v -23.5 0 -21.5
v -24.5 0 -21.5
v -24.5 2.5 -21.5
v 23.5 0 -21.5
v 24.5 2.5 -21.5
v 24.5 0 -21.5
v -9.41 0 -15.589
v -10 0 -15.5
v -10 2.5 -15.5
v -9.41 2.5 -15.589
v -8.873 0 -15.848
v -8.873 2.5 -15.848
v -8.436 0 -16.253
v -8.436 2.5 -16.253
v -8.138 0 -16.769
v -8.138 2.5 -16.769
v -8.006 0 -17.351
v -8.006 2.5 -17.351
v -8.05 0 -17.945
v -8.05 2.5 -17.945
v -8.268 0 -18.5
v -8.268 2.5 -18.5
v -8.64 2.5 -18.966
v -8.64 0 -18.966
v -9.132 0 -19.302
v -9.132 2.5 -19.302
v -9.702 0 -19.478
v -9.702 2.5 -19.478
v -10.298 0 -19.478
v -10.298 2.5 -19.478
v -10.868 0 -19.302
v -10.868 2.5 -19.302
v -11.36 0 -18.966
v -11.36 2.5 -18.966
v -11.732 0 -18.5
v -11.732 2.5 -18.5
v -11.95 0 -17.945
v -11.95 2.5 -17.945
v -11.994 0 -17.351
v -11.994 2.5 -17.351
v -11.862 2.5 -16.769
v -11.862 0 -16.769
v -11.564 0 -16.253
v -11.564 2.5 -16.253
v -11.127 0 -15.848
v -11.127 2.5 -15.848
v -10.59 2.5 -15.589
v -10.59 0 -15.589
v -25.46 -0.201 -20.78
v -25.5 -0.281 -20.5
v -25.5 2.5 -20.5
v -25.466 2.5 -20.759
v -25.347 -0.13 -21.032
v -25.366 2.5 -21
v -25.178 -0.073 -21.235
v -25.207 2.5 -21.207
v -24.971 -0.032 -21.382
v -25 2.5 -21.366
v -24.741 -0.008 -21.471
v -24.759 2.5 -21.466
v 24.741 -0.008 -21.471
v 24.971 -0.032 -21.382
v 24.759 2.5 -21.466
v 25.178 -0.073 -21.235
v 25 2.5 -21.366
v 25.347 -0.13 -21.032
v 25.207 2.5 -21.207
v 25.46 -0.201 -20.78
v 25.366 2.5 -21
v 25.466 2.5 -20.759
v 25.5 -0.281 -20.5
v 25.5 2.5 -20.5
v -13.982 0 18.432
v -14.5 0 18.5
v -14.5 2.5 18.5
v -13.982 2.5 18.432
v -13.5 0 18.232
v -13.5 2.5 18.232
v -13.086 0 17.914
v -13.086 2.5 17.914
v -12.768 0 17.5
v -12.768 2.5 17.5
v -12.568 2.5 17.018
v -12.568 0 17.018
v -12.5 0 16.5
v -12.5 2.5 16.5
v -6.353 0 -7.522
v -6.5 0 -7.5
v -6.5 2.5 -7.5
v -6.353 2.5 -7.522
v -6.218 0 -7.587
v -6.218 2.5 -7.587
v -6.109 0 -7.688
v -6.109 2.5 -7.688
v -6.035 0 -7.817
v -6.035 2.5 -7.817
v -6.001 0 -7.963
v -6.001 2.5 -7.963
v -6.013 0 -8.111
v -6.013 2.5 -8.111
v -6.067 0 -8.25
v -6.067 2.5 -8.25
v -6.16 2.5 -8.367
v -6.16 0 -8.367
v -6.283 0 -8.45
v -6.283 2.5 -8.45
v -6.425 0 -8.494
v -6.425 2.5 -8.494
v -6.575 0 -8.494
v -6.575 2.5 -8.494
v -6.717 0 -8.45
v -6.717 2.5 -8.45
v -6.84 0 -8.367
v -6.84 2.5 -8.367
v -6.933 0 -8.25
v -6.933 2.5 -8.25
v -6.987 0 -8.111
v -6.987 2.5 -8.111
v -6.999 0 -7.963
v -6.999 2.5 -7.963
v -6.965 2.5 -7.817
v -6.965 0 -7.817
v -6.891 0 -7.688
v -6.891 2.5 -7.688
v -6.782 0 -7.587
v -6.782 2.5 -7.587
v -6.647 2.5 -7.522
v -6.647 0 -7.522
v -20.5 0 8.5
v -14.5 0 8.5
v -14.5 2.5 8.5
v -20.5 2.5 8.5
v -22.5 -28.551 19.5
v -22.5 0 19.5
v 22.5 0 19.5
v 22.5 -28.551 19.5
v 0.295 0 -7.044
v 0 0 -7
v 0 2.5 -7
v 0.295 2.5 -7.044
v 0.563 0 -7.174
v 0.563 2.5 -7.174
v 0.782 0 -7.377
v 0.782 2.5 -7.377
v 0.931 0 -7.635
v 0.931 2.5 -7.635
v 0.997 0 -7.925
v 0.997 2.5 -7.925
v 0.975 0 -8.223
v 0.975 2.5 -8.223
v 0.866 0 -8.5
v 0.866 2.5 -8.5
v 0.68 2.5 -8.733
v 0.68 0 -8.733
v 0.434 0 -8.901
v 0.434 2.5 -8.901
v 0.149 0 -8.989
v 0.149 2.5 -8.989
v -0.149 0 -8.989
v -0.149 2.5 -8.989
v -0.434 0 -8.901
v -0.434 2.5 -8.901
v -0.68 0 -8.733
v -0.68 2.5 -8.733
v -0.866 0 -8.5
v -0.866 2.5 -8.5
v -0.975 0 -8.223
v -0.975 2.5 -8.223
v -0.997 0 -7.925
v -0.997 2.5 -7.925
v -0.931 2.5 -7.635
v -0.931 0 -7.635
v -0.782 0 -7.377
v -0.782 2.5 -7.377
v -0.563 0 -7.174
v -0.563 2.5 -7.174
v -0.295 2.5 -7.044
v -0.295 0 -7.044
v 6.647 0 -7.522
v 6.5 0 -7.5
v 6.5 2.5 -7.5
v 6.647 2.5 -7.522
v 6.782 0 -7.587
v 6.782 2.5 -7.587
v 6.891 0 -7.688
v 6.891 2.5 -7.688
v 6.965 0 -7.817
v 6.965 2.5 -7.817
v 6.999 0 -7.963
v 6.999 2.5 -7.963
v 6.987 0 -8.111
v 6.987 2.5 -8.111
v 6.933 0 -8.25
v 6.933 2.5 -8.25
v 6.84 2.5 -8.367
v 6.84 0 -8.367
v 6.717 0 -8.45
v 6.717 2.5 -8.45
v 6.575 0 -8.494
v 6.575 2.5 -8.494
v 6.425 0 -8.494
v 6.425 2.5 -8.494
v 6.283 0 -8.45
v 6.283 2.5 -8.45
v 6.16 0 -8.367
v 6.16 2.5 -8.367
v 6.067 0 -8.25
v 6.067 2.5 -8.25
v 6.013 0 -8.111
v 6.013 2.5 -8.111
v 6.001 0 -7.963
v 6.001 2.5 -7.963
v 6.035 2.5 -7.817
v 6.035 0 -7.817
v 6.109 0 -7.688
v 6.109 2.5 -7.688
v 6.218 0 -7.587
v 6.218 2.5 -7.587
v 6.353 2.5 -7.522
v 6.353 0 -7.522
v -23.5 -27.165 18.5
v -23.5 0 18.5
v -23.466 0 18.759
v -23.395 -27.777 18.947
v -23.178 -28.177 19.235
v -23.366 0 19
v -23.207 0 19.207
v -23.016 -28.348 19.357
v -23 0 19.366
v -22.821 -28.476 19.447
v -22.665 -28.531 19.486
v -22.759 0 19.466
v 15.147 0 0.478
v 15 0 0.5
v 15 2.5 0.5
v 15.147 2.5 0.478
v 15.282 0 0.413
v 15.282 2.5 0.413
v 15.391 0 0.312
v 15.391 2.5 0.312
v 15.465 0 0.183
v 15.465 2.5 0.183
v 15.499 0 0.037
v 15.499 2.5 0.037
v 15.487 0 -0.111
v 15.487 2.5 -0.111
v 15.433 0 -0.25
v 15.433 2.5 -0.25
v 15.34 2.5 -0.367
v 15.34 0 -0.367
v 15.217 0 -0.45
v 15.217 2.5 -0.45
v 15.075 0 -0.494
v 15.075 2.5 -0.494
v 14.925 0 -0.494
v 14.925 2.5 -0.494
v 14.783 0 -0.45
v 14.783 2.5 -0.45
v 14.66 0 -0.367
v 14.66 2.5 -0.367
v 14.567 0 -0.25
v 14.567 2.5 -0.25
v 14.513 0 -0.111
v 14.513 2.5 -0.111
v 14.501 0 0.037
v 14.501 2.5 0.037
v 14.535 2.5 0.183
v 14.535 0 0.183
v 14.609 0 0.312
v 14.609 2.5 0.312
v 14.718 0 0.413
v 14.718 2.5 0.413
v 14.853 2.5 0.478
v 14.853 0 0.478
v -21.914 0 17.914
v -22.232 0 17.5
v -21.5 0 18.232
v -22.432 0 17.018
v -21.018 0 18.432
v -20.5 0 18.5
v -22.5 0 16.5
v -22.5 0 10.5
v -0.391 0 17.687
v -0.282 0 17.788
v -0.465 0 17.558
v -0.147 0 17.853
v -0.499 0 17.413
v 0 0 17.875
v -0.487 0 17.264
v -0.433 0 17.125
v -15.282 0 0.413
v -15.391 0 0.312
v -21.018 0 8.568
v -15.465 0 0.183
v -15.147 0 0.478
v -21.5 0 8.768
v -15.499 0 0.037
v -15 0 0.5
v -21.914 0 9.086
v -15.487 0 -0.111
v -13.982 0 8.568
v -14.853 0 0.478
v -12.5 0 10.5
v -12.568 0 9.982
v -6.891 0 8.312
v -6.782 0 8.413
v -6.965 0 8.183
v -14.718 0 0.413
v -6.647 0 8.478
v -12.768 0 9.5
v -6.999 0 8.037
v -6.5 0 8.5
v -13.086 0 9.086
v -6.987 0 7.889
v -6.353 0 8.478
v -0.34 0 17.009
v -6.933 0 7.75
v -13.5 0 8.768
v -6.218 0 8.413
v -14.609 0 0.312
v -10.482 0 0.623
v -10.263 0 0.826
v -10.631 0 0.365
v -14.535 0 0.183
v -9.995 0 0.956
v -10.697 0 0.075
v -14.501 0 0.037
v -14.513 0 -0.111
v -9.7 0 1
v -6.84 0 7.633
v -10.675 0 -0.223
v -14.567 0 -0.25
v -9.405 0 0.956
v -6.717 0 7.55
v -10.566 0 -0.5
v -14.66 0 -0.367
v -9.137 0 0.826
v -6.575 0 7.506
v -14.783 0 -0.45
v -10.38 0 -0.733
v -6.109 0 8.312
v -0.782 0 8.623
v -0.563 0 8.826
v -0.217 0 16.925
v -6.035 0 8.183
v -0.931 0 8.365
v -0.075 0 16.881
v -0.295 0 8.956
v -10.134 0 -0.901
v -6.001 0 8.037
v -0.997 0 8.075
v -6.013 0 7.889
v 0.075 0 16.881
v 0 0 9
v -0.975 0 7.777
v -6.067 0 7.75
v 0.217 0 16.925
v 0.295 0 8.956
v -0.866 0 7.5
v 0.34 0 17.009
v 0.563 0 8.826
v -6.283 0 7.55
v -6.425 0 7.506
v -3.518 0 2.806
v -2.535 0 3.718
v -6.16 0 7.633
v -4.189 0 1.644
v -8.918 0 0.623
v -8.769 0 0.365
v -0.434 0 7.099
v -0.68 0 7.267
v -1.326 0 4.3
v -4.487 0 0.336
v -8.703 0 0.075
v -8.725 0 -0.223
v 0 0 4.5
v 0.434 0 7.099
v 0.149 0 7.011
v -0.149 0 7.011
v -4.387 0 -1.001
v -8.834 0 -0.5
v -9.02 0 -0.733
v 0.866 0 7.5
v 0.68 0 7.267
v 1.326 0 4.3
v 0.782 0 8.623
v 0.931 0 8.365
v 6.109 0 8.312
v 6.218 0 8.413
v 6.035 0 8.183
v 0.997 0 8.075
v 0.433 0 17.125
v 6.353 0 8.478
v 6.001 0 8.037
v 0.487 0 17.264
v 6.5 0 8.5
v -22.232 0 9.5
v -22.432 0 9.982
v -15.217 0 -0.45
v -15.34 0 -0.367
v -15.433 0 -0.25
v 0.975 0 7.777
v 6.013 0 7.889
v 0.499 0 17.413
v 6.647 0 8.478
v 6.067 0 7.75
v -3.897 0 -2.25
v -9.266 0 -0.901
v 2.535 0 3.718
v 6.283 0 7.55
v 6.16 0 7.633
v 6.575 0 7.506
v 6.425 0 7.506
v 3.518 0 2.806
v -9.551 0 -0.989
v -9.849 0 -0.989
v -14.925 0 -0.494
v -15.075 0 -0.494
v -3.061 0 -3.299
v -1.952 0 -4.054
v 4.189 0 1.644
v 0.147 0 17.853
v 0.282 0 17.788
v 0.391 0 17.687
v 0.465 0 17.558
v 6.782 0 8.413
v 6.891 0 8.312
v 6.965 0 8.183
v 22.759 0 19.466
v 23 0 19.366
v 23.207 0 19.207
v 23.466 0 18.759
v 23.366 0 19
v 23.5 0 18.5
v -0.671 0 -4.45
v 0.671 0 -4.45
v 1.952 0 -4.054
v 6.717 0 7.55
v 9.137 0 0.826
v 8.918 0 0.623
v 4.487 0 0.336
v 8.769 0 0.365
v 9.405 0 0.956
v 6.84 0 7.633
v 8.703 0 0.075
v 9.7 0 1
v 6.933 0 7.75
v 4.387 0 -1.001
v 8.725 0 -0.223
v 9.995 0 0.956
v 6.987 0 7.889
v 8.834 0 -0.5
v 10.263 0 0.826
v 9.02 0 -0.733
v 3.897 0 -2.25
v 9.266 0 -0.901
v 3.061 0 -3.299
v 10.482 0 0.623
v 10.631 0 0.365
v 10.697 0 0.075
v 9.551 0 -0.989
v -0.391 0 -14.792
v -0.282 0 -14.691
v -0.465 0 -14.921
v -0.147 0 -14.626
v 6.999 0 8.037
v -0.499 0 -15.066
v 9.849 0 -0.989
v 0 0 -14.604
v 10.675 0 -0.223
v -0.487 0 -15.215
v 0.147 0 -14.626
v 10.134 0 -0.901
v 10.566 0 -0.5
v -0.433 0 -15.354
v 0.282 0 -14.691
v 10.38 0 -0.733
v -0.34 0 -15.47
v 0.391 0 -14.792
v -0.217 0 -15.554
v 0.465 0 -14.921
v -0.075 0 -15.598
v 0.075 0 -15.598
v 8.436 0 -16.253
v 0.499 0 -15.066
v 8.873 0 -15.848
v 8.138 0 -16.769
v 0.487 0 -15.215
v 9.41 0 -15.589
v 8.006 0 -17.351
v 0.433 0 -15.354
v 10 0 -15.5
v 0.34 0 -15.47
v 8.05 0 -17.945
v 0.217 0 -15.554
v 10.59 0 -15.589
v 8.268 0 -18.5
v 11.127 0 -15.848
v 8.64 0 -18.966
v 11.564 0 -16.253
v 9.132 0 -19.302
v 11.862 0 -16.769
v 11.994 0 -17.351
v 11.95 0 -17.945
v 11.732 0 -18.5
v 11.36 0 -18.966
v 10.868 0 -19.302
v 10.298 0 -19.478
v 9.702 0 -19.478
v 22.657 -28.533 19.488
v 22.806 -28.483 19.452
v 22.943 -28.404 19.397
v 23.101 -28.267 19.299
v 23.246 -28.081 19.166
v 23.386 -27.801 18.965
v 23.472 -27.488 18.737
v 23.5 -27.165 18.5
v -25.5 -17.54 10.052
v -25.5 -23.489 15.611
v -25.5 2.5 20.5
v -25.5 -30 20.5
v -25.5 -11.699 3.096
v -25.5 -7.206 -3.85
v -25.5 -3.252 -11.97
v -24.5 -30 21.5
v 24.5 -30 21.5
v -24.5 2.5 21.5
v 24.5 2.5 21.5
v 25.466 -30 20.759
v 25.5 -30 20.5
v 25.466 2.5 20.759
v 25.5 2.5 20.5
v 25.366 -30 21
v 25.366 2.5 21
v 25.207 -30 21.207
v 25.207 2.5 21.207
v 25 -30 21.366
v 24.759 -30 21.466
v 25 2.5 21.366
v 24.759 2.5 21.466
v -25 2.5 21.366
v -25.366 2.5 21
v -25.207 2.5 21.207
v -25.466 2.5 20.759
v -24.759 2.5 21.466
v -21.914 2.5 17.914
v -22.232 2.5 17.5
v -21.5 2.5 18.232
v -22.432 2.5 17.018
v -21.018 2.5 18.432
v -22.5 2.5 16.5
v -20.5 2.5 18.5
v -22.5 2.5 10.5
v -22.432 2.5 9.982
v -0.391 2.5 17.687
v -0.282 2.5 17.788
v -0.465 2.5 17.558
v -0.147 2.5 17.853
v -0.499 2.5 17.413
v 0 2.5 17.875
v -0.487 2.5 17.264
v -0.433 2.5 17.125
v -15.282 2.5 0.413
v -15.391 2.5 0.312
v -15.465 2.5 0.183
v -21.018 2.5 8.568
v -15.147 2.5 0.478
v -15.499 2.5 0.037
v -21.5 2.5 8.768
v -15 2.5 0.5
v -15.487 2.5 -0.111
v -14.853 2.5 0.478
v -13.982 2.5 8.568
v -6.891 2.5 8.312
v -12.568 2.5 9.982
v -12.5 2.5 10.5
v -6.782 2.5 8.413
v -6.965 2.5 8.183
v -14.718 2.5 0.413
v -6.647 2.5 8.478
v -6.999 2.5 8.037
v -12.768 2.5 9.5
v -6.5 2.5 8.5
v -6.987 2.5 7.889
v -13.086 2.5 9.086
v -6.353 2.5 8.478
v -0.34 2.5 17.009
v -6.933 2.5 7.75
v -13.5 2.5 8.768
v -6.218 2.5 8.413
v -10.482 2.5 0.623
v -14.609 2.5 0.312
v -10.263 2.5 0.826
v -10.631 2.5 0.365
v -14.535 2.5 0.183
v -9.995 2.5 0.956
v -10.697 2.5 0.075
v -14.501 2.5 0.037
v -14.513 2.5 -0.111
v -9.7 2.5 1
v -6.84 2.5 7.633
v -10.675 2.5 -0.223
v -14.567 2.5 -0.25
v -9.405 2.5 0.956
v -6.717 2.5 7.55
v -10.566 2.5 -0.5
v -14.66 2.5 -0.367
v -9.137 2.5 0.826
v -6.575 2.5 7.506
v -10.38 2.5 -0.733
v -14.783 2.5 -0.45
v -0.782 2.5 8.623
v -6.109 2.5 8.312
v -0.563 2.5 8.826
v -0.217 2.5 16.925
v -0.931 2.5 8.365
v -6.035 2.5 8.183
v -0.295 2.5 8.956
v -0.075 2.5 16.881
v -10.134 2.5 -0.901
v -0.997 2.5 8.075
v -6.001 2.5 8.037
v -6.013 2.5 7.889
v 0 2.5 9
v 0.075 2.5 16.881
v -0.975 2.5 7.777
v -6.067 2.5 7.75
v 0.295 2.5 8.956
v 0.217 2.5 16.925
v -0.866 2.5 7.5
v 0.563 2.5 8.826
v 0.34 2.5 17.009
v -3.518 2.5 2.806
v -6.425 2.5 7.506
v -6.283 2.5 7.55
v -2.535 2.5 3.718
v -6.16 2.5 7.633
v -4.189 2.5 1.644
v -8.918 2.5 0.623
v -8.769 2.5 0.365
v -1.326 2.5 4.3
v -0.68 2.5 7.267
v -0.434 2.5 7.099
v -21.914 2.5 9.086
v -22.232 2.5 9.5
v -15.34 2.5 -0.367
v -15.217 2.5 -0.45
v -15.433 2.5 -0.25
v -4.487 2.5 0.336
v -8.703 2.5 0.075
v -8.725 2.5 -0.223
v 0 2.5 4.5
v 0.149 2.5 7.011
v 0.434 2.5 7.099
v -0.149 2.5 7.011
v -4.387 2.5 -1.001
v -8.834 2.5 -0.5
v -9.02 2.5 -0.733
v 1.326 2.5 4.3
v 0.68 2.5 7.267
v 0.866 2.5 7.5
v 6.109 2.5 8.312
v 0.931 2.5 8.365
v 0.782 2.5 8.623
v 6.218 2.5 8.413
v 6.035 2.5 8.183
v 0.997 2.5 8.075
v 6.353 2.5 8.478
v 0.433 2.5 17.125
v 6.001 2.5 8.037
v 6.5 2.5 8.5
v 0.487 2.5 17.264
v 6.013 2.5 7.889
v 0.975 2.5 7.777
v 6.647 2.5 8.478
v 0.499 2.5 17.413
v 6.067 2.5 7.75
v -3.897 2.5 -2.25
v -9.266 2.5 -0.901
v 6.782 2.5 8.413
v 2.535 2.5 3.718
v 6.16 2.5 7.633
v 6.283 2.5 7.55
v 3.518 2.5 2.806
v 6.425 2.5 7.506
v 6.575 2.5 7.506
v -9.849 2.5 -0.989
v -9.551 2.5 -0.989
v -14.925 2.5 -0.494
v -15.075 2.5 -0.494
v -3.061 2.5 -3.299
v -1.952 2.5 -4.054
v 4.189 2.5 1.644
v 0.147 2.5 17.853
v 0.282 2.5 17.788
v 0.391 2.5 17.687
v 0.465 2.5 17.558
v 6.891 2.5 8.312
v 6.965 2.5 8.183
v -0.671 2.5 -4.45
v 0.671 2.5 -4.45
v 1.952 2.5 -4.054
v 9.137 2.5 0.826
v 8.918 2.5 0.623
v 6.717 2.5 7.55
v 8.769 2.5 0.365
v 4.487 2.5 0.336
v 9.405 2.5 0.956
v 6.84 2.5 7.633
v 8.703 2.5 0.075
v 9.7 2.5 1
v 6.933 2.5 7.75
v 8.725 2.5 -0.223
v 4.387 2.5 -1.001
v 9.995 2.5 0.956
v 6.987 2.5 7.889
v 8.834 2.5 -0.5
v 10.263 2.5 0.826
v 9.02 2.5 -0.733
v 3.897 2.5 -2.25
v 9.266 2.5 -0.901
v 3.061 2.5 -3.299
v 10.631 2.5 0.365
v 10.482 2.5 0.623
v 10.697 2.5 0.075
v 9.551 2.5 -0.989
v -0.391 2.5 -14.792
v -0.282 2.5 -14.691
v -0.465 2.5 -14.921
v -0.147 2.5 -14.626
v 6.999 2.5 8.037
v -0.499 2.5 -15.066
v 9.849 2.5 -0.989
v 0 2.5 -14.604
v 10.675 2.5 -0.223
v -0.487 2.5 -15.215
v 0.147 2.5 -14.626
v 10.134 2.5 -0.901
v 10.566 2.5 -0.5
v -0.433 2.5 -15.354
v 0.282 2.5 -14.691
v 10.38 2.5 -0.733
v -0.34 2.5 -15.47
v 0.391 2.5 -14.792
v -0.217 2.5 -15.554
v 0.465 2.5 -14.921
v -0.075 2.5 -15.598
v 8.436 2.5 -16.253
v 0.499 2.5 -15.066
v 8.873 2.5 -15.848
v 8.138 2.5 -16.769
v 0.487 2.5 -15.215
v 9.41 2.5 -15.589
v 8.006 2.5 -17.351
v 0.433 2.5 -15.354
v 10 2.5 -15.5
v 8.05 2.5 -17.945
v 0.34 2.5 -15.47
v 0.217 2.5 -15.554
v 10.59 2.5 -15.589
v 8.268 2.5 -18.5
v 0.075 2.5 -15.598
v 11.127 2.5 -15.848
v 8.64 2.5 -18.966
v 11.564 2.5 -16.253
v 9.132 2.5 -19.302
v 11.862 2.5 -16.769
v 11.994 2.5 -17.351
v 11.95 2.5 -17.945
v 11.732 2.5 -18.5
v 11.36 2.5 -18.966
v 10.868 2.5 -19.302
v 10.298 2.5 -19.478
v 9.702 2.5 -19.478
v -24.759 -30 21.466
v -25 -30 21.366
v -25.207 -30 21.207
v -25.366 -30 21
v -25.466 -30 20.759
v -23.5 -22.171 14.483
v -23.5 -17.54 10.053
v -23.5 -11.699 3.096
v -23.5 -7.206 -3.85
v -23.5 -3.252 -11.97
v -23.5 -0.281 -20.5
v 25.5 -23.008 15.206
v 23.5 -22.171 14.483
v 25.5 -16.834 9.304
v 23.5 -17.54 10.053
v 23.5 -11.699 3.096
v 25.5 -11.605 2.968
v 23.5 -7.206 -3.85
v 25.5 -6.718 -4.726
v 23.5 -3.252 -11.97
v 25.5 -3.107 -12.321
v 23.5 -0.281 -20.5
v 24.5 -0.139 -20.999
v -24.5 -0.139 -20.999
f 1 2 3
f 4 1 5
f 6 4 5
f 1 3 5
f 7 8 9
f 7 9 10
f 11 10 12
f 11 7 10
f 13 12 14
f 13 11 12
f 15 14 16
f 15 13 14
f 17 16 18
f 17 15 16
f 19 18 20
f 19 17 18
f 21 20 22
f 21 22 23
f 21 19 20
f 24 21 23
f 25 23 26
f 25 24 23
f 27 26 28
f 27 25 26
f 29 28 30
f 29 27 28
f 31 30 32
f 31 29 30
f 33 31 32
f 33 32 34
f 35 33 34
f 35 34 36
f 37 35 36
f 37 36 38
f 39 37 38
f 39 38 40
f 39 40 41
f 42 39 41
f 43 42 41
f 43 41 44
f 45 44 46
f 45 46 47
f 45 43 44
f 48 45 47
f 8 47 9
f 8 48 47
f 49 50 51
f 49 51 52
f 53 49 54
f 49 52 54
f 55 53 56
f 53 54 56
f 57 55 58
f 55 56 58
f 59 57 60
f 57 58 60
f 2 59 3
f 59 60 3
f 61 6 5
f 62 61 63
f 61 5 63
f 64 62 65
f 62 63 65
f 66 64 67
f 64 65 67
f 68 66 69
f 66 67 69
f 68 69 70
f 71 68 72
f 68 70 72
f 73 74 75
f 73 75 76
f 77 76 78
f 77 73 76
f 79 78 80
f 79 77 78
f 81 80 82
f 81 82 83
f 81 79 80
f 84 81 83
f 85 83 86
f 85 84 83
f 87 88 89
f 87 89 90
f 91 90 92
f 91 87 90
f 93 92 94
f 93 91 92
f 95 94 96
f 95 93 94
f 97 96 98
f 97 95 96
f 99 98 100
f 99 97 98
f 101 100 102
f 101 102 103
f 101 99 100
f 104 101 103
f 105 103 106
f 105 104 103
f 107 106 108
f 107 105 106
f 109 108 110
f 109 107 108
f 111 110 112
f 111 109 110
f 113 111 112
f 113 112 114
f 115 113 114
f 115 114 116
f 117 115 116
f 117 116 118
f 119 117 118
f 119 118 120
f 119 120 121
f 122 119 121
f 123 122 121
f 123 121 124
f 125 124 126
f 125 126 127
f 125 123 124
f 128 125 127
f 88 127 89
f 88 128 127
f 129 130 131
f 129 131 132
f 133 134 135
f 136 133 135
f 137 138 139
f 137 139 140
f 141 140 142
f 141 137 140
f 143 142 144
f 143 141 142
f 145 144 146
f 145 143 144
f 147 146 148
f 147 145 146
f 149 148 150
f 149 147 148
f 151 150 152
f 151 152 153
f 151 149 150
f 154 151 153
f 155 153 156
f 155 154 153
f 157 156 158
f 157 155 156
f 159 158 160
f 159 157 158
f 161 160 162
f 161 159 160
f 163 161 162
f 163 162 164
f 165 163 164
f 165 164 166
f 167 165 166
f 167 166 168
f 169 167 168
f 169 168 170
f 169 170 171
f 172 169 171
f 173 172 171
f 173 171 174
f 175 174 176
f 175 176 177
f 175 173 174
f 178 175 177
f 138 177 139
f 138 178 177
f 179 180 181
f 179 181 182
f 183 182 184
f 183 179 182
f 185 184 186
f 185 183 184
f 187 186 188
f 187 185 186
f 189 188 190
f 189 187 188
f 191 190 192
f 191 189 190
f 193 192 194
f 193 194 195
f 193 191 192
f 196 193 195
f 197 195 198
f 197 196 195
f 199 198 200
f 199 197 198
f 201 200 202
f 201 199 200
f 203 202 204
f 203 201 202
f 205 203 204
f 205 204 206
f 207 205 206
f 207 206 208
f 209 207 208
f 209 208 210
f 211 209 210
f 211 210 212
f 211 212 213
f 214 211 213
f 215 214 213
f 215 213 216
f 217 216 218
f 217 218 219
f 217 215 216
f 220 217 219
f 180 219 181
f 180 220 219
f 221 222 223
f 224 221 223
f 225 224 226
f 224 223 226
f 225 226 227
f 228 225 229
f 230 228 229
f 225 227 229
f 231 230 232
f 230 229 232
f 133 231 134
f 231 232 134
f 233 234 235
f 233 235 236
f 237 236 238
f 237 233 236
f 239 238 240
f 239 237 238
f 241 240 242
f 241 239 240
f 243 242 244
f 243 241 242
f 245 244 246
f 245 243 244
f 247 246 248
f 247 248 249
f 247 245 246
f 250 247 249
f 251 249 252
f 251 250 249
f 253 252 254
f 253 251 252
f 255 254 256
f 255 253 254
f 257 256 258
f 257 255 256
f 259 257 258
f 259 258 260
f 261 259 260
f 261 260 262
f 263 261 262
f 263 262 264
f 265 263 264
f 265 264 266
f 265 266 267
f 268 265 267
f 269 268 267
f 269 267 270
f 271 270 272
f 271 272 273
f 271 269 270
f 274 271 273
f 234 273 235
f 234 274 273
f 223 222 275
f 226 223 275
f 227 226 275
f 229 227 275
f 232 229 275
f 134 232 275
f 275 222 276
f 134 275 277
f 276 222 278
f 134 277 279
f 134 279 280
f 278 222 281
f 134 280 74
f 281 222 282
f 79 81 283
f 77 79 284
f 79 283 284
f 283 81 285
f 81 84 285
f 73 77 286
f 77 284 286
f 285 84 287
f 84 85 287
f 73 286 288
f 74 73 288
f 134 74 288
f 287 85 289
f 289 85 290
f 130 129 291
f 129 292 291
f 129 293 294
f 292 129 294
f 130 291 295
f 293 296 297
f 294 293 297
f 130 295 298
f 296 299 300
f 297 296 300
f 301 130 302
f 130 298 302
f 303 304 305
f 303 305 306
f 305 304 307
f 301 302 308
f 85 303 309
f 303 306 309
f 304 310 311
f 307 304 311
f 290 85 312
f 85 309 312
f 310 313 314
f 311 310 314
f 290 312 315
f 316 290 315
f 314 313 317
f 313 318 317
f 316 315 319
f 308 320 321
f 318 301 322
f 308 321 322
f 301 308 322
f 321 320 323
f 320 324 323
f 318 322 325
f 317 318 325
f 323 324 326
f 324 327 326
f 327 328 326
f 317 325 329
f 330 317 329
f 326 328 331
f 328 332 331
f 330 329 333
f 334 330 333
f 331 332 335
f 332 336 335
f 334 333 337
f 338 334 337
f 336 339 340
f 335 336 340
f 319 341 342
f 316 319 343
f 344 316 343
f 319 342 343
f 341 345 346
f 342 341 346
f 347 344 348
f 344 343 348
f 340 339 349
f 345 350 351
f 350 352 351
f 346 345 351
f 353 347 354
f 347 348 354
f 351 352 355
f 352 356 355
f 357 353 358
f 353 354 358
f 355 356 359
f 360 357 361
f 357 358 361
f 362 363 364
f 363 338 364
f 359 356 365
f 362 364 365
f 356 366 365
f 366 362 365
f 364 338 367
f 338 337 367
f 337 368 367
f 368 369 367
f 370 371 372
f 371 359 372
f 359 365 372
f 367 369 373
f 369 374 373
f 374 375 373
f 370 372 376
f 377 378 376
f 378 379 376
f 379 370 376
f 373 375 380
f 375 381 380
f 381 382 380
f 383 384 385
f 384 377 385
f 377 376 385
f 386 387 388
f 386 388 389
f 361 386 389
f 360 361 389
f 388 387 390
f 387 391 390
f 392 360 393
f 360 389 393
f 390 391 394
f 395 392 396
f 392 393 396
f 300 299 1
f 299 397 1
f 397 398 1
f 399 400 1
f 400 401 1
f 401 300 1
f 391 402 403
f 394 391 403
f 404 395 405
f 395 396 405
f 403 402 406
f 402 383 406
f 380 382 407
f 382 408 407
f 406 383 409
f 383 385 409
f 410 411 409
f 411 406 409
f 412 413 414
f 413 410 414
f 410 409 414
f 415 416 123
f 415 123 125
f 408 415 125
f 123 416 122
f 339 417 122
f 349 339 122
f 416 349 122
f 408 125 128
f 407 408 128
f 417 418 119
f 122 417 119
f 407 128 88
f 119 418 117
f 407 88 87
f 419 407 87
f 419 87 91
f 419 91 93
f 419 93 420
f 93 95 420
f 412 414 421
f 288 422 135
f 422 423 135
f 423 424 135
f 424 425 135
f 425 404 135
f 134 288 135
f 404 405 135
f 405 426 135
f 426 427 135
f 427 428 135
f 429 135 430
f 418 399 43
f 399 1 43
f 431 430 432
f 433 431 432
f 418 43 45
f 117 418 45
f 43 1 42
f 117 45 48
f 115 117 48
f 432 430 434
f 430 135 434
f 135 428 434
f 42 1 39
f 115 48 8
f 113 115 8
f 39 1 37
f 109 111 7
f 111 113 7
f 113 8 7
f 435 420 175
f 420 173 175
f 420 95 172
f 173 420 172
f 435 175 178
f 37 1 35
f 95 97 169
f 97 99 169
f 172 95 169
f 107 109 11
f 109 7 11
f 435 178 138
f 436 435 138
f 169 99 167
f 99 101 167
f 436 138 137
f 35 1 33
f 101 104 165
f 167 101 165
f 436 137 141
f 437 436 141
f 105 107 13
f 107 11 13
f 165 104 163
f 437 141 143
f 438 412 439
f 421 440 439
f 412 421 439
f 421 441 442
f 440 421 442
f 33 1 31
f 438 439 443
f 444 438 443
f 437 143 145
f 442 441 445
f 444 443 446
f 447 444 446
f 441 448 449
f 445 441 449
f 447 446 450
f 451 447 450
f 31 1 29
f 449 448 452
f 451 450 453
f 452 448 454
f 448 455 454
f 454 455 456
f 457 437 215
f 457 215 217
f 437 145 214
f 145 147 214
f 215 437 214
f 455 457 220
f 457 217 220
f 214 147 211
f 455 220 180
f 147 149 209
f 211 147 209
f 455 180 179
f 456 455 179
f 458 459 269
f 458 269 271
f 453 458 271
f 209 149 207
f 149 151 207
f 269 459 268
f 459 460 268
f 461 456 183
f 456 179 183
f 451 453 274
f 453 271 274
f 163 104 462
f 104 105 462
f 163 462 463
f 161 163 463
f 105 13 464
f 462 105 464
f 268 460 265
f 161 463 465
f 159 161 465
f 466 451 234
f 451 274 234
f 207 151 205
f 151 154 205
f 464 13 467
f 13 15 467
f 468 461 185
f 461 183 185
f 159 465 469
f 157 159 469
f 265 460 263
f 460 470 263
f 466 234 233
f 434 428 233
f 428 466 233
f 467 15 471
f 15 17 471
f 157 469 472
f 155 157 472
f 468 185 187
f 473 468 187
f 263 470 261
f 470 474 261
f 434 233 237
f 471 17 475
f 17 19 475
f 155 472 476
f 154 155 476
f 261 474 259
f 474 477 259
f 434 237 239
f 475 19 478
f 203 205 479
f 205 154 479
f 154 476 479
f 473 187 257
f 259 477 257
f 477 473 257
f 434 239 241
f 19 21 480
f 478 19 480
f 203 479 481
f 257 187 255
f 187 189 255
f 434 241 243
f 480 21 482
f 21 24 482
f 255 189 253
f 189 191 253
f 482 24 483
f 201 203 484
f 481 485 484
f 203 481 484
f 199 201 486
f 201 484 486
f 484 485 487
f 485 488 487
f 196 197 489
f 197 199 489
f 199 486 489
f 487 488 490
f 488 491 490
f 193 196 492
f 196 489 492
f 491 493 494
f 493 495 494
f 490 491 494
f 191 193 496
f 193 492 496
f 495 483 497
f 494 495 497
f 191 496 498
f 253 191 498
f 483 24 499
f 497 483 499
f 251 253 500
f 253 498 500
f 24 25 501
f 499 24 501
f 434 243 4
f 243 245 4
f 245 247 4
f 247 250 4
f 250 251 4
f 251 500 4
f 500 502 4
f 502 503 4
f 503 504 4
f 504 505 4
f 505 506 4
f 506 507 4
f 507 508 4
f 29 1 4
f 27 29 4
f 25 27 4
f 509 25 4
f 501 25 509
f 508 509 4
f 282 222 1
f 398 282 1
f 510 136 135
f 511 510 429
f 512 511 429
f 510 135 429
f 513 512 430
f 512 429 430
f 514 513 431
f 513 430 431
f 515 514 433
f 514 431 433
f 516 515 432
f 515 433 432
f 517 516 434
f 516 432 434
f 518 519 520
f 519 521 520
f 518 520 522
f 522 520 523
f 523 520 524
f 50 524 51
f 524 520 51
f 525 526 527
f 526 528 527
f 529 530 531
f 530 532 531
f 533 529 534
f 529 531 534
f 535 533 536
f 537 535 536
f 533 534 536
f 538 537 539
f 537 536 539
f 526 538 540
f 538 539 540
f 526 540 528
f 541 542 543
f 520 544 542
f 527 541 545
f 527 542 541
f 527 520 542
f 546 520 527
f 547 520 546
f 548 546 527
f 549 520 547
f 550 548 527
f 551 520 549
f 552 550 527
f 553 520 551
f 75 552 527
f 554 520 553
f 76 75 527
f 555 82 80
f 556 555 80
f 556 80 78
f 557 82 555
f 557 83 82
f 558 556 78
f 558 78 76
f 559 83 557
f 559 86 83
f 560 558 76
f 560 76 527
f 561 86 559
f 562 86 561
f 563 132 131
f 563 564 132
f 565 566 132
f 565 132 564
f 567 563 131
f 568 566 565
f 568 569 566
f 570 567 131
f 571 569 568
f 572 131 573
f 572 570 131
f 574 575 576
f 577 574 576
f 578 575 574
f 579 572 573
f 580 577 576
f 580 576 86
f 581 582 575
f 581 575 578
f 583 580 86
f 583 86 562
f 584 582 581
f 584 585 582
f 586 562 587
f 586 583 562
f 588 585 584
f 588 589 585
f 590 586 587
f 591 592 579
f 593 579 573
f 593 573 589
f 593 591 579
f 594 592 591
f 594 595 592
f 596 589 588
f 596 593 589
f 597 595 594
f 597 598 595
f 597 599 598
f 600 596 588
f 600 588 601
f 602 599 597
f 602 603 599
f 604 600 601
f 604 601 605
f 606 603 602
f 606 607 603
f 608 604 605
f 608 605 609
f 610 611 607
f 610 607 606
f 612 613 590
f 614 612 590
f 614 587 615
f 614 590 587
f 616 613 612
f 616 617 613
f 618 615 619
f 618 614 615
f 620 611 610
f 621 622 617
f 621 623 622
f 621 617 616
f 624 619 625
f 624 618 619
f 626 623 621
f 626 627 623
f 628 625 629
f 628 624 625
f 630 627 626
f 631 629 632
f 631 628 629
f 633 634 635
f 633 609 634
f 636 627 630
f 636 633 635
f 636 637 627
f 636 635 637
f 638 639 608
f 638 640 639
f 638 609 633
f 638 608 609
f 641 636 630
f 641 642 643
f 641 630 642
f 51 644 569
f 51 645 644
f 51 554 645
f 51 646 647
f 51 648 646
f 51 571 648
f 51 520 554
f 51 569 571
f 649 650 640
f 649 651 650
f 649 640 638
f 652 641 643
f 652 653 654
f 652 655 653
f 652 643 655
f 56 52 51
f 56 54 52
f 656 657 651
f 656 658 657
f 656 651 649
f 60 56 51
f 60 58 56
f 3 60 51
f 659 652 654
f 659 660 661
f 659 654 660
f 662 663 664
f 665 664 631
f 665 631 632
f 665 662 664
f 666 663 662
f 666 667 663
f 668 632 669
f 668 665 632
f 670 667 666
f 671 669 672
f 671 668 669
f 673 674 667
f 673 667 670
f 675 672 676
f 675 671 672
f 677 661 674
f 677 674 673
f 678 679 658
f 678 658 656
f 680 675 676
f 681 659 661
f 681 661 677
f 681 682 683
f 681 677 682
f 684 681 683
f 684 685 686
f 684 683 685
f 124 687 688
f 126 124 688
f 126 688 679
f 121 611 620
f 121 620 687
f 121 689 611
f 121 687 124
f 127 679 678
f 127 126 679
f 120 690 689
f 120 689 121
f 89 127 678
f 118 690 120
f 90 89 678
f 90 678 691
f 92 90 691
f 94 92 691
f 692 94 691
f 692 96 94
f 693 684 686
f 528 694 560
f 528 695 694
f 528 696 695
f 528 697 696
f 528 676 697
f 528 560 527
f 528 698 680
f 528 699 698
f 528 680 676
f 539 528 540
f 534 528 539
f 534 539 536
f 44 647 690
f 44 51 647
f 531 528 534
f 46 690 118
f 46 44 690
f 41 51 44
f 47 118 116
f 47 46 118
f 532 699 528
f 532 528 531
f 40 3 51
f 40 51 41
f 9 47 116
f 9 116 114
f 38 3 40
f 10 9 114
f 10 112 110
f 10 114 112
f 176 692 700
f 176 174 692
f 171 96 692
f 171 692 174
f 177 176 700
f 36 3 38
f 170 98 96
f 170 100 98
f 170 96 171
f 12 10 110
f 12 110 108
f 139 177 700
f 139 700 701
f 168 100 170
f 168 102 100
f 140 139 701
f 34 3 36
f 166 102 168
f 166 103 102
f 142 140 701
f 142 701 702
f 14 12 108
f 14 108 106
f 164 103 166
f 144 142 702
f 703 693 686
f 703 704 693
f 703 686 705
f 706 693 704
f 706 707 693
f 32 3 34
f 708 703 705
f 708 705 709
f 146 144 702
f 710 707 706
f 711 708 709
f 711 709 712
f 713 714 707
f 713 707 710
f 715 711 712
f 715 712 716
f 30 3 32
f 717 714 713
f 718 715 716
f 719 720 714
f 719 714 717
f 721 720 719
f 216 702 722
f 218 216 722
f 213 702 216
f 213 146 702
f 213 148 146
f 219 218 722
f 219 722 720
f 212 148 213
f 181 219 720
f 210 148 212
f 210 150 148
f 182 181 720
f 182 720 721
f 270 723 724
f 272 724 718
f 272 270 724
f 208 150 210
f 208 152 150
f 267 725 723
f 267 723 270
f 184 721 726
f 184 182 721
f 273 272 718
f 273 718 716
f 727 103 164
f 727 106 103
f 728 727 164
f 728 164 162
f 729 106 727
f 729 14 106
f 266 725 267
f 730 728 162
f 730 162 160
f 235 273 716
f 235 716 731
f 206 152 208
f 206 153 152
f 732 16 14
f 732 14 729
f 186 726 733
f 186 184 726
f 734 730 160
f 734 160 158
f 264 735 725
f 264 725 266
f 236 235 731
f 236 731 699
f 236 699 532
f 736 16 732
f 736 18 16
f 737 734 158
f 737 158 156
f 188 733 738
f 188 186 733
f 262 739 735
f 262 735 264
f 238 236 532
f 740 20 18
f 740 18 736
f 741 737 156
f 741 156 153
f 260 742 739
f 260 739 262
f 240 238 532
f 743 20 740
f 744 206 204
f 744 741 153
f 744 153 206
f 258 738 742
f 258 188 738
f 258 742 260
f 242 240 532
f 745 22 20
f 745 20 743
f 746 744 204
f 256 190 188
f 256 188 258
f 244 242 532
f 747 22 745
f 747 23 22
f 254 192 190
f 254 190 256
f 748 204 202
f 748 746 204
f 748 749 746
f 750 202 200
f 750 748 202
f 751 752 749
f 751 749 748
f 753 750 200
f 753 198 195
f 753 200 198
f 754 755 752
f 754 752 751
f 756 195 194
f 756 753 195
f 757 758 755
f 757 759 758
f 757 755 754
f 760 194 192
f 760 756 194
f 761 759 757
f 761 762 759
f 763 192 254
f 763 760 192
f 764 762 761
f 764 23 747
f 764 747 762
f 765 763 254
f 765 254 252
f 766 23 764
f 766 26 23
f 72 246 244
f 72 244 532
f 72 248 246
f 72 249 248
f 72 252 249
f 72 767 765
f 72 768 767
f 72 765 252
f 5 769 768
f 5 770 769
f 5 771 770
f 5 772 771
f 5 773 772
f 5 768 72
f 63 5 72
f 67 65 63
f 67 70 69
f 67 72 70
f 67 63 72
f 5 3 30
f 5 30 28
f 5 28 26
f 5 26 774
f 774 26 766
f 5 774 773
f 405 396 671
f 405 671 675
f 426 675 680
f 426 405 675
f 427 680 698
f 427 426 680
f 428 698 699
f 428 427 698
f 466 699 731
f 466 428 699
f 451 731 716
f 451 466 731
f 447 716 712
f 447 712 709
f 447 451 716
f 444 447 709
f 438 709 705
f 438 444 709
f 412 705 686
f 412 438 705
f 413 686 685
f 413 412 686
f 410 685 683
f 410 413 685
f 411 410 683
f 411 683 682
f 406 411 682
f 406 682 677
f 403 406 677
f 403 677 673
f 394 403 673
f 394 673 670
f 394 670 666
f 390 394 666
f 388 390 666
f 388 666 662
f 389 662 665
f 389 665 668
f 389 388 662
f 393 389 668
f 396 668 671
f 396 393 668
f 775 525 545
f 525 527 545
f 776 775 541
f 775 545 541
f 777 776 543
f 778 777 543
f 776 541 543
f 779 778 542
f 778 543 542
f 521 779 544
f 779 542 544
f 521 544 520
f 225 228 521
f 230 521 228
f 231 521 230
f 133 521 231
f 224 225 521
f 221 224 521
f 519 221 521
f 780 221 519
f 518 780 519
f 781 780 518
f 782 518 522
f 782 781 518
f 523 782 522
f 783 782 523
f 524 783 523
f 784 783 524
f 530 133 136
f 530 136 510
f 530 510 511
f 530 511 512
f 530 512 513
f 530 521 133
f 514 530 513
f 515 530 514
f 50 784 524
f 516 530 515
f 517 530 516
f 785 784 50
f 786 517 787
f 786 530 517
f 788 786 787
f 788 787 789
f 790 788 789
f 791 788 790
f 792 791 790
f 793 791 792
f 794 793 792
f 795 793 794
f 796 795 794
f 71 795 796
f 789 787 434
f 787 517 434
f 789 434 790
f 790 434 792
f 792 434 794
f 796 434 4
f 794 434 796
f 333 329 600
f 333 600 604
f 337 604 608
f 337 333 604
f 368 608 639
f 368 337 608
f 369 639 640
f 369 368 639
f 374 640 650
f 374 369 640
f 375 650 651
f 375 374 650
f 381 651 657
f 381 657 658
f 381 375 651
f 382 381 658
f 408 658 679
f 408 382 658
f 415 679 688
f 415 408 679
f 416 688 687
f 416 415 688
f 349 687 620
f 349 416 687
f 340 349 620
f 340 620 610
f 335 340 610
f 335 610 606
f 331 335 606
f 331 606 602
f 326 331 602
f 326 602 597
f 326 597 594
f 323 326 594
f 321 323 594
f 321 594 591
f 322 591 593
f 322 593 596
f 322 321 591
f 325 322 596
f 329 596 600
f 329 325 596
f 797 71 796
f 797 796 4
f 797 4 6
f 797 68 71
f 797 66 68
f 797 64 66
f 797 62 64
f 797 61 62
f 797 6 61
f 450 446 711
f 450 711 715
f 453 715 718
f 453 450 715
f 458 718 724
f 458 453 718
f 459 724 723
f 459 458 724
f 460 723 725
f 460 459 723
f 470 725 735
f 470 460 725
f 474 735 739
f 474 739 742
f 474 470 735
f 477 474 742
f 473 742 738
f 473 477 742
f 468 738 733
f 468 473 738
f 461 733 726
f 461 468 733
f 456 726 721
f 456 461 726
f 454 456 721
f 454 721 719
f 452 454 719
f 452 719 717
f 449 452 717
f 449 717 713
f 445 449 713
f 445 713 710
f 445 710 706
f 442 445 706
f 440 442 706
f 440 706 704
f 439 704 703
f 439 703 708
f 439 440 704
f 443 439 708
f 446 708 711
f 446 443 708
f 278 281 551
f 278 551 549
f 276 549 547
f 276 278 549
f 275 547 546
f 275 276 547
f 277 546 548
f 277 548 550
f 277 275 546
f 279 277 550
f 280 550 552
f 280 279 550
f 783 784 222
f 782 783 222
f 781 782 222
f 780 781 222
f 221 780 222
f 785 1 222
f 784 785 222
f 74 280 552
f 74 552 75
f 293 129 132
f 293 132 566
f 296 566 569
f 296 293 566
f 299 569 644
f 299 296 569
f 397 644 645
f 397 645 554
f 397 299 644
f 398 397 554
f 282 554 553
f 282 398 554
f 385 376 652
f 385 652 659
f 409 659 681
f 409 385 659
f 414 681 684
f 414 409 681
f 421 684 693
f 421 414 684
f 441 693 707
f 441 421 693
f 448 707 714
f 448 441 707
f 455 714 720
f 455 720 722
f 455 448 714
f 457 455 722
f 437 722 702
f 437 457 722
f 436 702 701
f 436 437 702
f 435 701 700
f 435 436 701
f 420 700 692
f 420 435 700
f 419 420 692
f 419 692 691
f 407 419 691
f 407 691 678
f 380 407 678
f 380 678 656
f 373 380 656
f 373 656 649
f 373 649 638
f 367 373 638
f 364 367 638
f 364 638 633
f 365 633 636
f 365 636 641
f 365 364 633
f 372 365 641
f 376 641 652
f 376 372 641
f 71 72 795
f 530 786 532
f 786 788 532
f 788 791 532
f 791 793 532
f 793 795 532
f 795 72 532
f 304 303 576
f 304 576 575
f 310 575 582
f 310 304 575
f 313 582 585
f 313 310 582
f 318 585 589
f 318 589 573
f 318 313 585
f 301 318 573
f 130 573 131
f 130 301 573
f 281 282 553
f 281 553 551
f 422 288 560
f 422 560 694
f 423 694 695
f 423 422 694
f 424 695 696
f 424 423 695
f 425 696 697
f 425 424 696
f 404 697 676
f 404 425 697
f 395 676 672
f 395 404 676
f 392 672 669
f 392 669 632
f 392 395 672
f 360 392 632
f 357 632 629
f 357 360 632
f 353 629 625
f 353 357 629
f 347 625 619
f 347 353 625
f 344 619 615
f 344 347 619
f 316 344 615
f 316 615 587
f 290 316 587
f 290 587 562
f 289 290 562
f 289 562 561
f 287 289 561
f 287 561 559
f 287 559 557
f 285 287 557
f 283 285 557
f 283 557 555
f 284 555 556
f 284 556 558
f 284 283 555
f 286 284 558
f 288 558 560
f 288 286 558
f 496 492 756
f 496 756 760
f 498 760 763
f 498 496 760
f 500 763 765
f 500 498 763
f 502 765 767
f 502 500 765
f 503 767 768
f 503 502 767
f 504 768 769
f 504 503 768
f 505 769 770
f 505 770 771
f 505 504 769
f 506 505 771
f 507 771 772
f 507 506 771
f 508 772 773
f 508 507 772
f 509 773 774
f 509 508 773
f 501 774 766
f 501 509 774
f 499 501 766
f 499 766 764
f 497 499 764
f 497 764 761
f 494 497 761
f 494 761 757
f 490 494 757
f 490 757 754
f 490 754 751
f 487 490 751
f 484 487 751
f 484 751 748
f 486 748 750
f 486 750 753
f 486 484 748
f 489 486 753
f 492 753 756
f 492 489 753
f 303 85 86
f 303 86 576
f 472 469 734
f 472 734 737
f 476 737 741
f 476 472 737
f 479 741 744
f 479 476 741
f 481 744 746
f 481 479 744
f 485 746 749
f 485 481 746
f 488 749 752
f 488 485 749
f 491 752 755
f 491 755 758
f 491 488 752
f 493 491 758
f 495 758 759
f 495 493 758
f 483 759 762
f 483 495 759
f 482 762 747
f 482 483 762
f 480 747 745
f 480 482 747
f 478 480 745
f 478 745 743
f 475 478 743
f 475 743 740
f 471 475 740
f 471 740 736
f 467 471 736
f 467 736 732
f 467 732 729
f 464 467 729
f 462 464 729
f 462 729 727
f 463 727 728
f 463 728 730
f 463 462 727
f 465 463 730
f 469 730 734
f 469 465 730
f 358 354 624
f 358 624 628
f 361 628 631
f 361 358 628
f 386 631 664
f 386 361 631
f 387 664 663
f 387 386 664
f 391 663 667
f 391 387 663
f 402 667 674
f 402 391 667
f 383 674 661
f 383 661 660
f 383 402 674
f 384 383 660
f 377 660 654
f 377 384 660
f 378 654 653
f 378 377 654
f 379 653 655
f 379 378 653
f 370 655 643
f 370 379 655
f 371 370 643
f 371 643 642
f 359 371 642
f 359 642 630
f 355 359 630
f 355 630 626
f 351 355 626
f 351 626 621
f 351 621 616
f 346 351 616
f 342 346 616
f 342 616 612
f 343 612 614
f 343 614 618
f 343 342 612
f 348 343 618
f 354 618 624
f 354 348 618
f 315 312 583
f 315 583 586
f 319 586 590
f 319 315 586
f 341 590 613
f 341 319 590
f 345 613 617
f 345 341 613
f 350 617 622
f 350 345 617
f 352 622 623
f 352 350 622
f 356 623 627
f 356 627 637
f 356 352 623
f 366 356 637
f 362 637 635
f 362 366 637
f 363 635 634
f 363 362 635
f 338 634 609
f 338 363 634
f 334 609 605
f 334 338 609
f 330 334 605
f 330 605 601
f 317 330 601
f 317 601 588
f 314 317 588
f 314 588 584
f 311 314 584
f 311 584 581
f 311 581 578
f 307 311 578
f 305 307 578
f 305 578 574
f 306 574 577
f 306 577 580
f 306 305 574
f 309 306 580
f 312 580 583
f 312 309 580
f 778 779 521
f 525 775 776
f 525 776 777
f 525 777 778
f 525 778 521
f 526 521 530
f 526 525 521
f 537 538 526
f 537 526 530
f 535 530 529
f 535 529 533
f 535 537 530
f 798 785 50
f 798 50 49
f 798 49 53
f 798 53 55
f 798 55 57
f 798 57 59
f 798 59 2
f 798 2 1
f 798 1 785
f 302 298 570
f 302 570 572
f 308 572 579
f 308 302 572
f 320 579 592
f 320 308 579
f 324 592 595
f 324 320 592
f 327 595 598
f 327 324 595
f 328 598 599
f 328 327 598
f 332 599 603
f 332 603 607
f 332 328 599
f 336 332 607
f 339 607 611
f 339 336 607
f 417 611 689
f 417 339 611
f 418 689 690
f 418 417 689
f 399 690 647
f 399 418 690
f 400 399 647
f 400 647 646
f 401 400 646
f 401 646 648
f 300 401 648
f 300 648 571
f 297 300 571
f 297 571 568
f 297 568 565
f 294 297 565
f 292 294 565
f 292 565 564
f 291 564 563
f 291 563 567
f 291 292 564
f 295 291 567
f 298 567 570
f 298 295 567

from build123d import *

# Parameters (mm, degrees)
SKETCH1_W           = 51
SKETCH1_H           = 43
SKETCH1_R           = 4.5
SKETCH1_R_2         = 1
SKETCH1_R_3         = 2
SKETCH1_R_4         = 0.5
BOSS_EXTRUDE1_DEPTH = 2.5
FILLET1_R           = 1
BOSS_EXTRUDE2_DEPTH = 30
CUT_EXTRUDE1_DEPTH  = 67


with BuildPart() as part:
    # Sketch1 → Boss-Extrude1 (new body)
    with BuildSketch(Plane(origin=(0, 0, 0), x_dir=(1, 0, 0), z_dir=(0, 1, 0))):
        Rectangle(SKETCH1_W, SKETCH1_H)
        with Locations(Location((0, 0, 0), (0, 0, 270))):
            Circle(SKETCH1_R, mode=Mode.SUBTRACT)
        with Locations(Location((9.7, 0, 0), (0, 0, 270))):
            Circle(SKETCH1_R_2, mode=Mode.SUBTRACT)
        with Locations(Location((-9.7, 0, 0), (0, 0, 270))):
            Circle(SKETCH1_R_2, mode=Mode.SUBTRACT)
        with Locations(Location((0, 8, 0), (0, 0, 270))):
            Circle(SKETCH1_R_2, mode=Mode.SUBTRACT)
        with Locations(Location((0, -8, 0), (0, 0, 270))):
            Circle(SKETCH1_R_2, mode=Mode.SUBTRACT)
        with Locations(Location((-10, 17.5, 0), (0, 0, 270))):
            Circle(SKETCH1_R_3, mode=Mode.SUBTRACT)
        with Locations(Location((10, 17.5, 0), (0, 0, 270))):
            Circle(SKETCH1_R_3, mode=Mode.SUBTRACT)
        with Locations(Location((-15, 0, 0), (0, 0, 270))):
            Circle(SKETCH1_R_4, mode=Mode.SUBTRACT)
        with Locations(Location((15, 0, 0), (0, 0, 270))):
            Circle(SKETCH1_R_4, mode=Mode.SUBTRACT)
        with Locations(Location((0, -17.375333522, 0), (0, 0, 270))):
            Circle(SKETCH1_R_4, mode=Mode.SUBTRACT)
        with Locations(Location((0, 15.103719109, 0), (0, 0, 270))):
            Circle(SKETCH1_R_4, mode=Mode.SUBTRACT)
        with Locations(Location((6.5, 8, 0), (0, 0, 270))):
            Circle(SKETCH1_R_4, mode=Mode.SUBTRACT)
        with Locations(Location((-6.5, 8, 0), (0, 0, 270))):
            Circle(SKETCH1_R_4, mode=Mode.SUBTRACT)
        with Locations(Location((-6.5, -8, 0), (0, 0, 270))):
            Circle(SKETCH1_R_4, mode=Mode.SUBTRACT)
        with Locations(Location((6.5, -8, 0), (0, 0, 270))):
            Circle(SKETCH1_R_4, mode=Mode.SUBTRACT)
        with BuildLine():
            Line((-20.5, -18.5), (-14.5, -18.5))
            ThreePointArc((-14.5, -18.5), (-13.085786438, -17.914213562), (-12.5, -16.5))
            Line((-12.5, -16.5), (-12.5, -10.5))
            ThreePointArc((-12.5, -10.5), (-13.085786438, -9.085786438), (-14.5, -8.5))
            Line((-14.5, -8.5), (-20.5, -8.5))
            ThreePointArc((-20.5, -8.5), (-21.914213562, -9.085786438), (-22.5, -10.5))
            Line((-22.5, -10.5), (-22.5, -16.5))
            ThreePointArc((-22.5, -16.5), (-21.914213562, -17.914213562), (-20.5, -18.5))
        make_face(mode=Mode.SUBTRACT)
    extrude(amount=BOSS_EXTRUDE1_DEPTH)

    # Fillet1
    fillet1_edges = [part.edges().sort_by_distance(p)[0] for p in [
        (25.5, 1.25, -21.5),
        (25.5, 1.25, 21.5),
        (-25.5, 1.25, 21.5),
        (-25.5, 1.25, -21.5),
    ]]
    fillet(fillet1_edges, radius=FILLET1_R)

    # Sketch2 → Boss-Extrude2 (add)
    with BuildSketch(Plane.XZ):
        with BuildLine():
            Line((-23.5, -21.5), (-23.5, 18.5))
            ThreePointArc((-23.5, 18.5), (-23.207106781, 19.207106781), (-22.5, 19.5))
            Line((-22.5, 19.5), (22.5, 19.5))
            ThreePointArc((22.5, 19.5), (23.207106781, 19.207106781), (23.5, 18.5))
            Line((23.5, 18.5), (23.5, -21.5))
            Line((23.5, -21.5), (24.5, -21.5))
            ThreePointArc((24.5, -21.5), (25.207106781, -21.207106781), (25.5, -20.5))
            Line((25.5, -20.5), (25.5, 20.5))
            ThreePointArc((25.5, 20.5), (25.207106781, 21.207106781), (24.5, 21.5))
            Line((24.5, 21.5), (-24.5, 21.5))
            ThreePointArc((-24.5, 21.5), (-25.207106781, 21.207106781), (-25.5, 20.5))
            Line((-25.5, 20.5), (-25.5, -20.5))
            ThreePointArc((-25.5, -20.5), (-25.207106781, -21.207106781), (-24.5, -21.5))
            Line((-24.5, -21.5), (-23.5, -21.5))
        make_face()
    extrude(amount=BOSS_EXTRUDE2_DEPTH)

    # Sketch3 → Cut-Extrude1 (cut)
    with BuildSketch(Plane(origin=(25.5, 0, 0), x_dir=(0, 0, -1), z_dir=(1, 0, 0))):
        with BuildLine():
            add(Edge.make_bspline(
                [(-20.5, -30), (-5.501277344, -7.754009084), (20.5, -0.280836845)],
                knots=[0, 0, 0, 0.981207698, 0.981207698, 0.981207698], degree=2))
            Line((-20.5, -30), (20.5, -30))
            Line((20.5, -30), (20.5, -0.280836845))
        make_face()
        with BuildLine():
            Line((20.5, -30), (-20.5, -30))
            Line((-20.5, -30), (-11.71480256, -35.881315146))
            Line((-11.71480256, -35.881315146), (34.782094199, -34.613217961))
            Line((34.782094199, -34.613217961), (27.415053414, -3.212716254))
            Line((27.415053414, -3.212716254), (21.5, 0))
            add(Edge.make_bspline(
                [(20.5, -0.280836845), (20.997982091, -0.137709033), (21.5, 0)],
                knots=[0.981207698, 0.981207698, 0.981207698, 1, 1, 1], degree=2))
            Line((20.5, -0.280836845), (20.5, -30))
        make_face()
    extrude(amount=-CUT_EXTRUDE1_DEPTH, mode=Mode.SUBTRACT)


solid = part.part
